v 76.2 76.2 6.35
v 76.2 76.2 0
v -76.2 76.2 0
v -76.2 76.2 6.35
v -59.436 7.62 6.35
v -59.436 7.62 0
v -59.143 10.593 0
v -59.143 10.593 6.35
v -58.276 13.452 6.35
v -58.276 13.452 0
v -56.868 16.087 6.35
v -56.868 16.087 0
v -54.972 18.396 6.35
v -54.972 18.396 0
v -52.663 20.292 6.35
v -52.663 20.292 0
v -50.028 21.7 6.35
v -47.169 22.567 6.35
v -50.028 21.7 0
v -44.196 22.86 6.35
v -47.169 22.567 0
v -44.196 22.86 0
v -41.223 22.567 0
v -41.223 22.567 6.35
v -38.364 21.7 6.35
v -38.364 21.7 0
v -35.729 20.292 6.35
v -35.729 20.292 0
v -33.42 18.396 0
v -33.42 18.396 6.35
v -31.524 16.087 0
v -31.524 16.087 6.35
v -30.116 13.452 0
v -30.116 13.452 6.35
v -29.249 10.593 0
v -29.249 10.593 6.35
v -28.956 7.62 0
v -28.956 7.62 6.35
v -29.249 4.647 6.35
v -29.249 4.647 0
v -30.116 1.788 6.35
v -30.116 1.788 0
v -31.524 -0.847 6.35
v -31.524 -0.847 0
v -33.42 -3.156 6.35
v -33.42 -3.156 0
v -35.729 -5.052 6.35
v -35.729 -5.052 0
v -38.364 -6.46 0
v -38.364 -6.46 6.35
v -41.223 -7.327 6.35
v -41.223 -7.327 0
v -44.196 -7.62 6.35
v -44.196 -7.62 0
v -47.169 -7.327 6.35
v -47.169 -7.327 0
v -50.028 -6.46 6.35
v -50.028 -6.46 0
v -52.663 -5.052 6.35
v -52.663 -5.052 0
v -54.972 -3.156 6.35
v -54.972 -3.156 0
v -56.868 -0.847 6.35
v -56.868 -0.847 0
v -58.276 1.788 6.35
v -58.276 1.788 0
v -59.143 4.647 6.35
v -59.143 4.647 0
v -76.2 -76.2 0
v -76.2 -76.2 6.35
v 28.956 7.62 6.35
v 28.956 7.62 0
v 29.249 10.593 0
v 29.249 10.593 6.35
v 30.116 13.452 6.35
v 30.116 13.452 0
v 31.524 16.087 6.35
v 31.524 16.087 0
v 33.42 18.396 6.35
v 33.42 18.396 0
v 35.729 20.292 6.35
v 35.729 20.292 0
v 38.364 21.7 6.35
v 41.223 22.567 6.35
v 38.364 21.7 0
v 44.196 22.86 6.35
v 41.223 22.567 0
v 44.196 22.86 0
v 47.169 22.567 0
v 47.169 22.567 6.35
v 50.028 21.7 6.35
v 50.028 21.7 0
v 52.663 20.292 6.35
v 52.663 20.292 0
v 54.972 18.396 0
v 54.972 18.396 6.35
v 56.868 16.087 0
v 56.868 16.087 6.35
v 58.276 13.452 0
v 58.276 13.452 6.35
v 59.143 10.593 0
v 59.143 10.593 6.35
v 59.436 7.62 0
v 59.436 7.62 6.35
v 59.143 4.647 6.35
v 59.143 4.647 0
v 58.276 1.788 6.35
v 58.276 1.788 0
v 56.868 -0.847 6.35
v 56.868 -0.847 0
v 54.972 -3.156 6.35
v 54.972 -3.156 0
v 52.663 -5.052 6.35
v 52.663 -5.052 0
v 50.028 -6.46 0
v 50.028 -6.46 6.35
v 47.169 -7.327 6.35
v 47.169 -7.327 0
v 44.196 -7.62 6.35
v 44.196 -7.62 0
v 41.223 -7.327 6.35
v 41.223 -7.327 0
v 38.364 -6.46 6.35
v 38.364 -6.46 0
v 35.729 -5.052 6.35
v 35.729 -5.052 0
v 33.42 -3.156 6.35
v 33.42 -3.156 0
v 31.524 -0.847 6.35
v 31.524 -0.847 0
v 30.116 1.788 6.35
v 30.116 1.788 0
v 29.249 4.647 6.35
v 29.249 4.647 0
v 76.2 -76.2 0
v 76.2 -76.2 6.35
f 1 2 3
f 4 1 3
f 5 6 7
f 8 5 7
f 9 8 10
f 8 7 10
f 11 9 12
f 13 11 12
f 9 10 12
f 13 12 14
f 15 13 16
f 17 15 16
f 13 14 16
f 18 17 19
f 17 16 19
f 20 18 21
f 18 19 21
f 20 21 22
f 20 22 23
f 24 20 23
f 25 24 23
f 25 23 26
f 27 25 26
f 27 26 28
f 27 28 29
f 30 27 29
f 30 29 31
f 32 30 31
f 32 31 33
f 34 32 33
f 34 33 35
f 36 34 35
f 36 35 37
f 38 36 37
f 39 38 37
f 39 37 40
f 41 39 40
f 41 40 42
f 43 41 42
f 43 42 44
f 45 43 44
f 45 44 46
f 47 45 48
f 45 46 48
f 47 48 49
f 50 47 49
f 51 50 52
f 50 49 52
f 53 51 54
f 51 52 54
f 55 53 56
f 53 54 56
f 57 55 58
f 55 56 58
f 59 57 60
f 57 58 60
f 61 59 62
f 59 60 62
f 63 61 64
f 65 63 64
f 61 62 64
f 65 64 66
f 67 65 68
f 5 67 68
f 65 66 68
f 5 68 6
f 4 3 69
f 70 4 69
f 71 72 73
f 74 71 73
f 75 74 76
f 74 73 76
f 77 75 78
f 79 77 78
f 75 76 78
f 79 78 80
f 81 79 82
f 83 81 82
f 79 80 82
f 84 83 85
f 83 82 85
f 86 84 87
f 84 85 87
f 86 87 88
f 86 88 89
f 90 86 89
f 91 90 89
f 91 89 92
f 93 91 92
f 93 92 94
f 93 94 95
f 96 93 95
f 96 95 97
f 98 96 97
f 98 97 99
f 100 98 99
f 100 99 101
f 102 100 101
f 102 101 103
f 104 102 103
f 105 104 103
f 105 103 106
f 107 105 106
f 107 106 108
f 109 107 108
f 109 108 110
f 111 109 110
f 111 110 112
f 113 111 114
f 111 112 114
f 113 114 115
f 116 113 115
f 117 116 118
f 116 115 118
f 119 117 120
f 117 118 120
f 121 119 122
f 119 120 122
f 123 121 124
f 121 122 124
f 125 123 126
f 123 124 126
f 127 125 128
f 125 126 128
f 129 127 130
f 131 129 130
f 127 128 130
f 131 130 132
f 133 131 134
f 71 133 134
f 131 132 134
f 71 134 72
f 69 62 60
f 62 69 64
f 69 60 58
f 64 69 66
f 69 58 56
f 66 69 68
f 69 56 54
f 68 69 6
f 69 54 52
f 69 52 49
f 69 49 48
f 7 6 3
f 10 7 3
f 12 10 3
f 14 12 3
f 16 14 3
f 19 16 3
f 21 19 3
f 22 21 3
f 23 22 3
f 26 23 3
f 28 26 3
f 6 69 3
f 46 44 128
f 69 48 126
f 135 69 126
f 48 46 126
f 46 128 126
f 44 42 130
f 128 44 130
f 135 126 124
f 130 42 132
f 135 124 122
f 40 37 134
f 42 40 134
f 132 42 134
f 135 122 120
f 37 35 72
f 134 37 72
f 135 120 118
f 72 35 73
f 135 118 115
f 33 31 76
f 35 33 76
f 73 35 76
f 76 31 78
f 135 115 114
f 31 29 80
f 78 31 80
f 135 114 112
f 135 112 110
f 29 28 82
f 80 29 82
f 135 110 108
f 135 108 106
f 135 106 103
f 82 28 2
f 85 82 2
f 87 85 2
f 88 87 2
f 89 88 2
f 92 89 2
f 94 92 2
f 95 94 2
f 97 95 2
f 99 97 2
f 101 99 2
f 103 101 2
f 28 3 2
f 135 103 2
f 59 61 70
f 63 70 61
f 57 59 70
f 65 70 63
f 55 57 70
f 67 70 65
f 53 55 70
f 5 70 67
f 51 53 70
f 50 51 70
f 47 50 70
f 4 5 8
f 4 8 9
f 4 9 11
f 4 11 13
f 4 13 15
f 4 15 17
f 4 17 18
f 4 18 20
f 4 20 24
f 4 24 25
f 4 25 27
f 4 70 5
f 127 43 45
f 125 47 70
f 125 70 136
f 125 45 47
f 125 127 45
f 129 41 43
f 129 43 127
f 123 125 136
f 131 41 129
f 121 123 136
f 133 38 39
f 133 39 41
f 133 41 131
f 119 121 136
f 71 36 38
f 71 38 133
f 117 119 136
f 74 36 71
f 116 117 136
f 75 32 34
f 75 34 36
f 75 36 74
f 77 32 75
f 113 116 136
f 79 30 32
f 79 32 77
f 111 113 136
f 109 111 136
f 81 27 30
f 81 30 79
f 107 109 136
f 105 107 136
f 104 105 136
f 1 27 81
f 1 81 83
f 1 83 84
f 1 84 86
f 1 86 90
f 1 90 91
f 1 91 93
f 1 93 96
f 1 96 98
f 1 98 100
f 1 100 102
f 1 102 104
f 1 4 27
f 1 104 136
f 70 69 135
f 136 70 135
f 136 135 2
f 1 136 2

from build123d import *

# Parameters (mm, degrees)
F0_W     = 32.004
F0_H     = 83.82
F1_DEPTH = 6.35
F3_D     = 30.48


with BuildPart() as f1:
    # F0 (on Top) → F1 (new body)
    with BuildSketch(Plane.XY):
        Polygon((-44.196, -76.2), (44.196, -76.2), (44.196, 7.62), (76.2, 7.62), (76.2, 76.2), (-76.2, 76.2), (-76.2, 7.62), (-44.196, 7.62), align=None)
        with Locations((-60.198, -34.29)):
            Rectangle(F0_W, F0_H)
        with Locations((60.198, -34.29)):
            Rectangle(F0_W, F0_H)
    extrude(amount=F1_DEPTH)

    # F3 (through all)
    with Locations(Plane.XY.offset(6.35)):
        with Locations((-44.196, 7.62), (44.196, 7.62)):
            Hole(F3_D / 2)


solid = f1.part
